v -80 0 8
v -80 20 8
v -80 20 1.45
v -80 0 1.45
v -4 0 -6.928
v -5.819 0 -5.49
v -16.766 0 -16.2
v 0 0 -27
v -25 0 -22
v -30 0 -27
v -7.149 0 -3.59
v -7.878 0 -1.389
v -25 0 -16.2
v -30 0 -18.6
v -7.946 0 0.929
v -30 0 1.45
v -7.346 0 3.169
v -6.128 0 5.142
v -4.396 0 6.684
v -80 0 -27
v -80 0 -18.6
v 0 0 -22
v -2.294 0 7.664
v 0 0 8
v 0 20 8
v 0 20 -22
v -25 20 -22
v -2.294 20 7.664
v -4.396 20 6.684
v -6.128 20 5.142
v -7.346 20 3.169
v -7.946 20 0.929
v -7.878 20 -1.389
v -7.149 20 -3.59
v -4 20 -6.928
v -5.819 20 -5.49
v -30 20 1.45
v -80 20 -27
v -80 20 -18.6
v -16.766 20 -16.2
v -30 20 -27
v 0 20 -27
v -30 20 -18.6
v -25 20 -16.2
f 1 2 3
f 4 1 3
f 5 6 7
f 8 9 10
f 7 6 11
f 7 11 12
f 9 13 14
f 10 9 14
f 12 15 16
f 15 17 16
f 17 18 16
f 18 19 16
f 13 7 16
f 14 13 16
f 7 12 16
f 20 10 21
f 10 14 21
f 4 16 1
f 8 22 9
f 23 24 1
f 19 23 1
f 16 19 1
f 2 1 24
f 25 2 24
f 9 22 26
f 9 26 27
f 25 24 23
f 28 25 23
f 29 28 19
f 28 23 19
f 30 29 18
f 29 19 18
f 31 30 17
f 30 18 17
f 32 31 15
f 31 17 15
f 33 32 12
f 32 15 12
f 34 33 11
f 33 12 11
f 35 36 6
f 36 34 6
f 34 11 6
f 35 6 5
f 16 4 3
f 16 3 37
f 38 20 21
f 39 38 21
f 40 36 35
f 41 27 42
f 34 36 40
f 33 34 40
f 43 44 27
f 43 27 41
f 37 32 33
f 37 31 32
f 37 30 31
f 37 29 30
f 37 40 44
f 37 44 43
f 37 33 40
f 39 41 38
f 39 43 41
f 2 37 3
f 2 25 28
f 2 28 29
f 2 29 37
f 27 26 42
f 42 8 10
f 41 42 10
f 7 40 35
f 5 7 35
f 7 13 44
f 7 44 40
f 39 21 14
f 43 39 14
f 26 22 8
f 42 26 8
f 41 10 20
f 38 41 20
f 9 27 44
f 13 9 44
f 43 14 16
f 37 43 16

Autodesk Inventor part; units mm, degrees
ref_plane "YZ Plane" through (0, 0, 0) normal (1, 0, 0) x (0, 1, 0)
ref_plane "XZ Plane" through (0, 0, 0) normal (0, 1, 0) x (-1, 0, 0)
ref_plane "XY Plane" through (0, 0, 0) normal (0, 0, 1) x (1, 0, 0)
sketch "Skizze1" plane through (0, 0, 0) normal (0, 1, 0) x (-1, 0, 0)
  arc A0 (4, -6.9282) -> (0, 8) centre (0, 0) ccw
  line L0 (0, -22) -> (0, -27)
  line L1 (0, -27) -> (30, -27)
  line L2 (80, 8) -> (0, 8)
  line L3 (0, -22) -> (25, -22)
  line L4 (25, -22) -> (0, -22)
  line L5 (25, -22) -> (25, -16.2)
  line L6 (25, -16) -> (25, -22)
  line L7 (25, -16.2) -> (16.7663, -16.2)
  line L8 (16.7663, -16.2) -> (4, -6.9282)
  line L9 (30, -27) -> (80, -27)
  line L10 (80, -27) -> (80, -18.6)
  line L11 (80, -18.6) -> (30, -18.6)
  line L12 (80, 8) -> (80, 1.45)
  line L13 (80, 1.45) -> (30, 1.45)
  line L14 (30, -18.6) -> (30, 1.45)
  dimension "d0" = 5
  dimension "d9" = 50
  dimension "d10" = 8.4
  dimension "d12" = 20.05
extrude "Extrusion1" add sketch "Skizze1" along normal blind 20
properties part number "Halterung_MobileWhiteboard_V3"
